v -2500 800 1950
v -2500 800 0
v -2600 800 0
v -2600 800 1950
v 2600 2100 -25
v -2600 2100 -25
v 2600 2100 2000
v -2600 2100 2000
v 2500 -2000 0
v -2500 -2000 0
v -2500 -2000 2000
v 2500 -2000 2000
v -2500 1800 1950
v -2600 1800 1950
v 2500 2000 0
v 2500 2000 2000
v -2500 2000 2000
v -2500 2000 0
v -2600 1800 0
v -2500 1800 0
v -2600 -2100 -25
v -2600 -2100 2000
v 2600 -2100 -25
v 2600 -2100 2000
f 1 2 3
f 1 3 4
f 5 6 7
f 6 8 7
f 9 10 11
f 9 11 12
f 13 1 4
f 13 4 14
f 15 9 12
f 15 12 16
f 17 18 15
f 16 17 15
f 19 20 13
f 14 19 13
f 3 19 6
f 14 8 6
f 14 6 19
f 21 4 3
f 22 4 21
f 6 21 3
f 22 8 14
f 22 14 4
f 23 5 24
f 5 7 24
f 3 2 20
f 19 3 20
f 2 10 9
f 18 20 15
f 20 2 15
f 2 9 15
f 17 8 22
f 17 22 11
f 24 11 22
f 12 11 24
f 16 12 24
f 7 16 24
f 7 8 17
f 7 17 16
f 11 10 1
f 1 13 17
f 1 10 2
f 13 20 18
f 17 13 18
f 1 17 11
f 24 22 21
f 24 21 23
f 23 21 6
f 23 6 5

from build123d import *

# Parameters (mm, degrees)
F0_W     = 5200
F0_H     = 4200
F0_W_2   = 5000
F0_H_2   = 4000
F1_DEPTH = 2000
F2_W     = 5200
F2_H     = 4200
F2_W_2   = 5000
F2_H_2   = 4000
F3_DEPTH = 25
F4_W     = 1000
F4_H     = 1950
F5_DEPTH = 200


with BuildPart() as f1:
    # F0 (on Top) → F1 (new body)
    with BuildSketch(Plane.XY):
        Rectangle(F0_W, F0_H)
        Rectangle(F0_W_2, F0_H_2, mode=Mode.SUBTRACT)
    extrude(amount=F1_DEPTH)

    # F2 (on face) → F3 (join)
    with BuildSketch(Plane(origin=(0, 0, 0), x_dir=(1, 0, 0), z_dir=(0, 0, -1))):
        Rectangle(F2_W, F2_H)
        Rectangle(F2_W_2, F2_H_2, mode=Mode.SUBTRACT)
        Rectangle(F2_W_2, F2_H_2)
    extrude(amount=F3_DEPTH)

    # F4 (on face) → F5 (cut)
    with BuildSketch(Plane.YZ.offset(-2500)):
        with Locations((1300, 975)):
            Rectangle(F4_W, F4_H)
    extrude(amount=-F5_DEPTH, mode=Mode.SUBTRACT)


solid = f1.part
